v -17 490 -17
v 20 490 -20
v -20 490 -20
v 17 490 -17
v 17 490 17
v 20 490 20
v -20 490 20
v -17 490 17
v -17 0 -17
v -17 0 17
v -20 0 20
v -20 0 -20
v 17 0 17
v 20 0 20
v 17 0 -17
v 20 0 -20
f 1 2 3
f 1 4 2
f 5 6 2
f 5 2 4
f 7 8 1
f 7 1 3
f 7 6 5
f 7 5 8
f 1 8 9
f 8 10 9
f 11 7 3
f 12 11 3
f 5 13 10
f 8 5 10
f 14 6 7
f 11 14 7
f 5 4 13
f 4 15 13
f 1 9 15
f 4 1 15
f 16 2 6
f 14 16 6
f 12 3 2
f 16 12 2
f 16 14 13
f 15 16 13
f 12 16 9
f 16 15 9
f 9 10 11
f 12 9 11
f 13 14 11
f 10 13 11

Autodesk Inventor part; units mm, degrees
ref_plane "YZ Plane" through (0, 0, 0) normal (1, 0, 0) x (0, 1, 0)
ref_plane "XZ Plane" through (0, 0, 0) normal (0, 1, 0) x (-1, 0, 0)
ref_plane "XY Plane" through (0, 0, 0) normal (0, 0, 1) x (1, 0, 0)
sketch "Sketch1" plane through (0, 0, 0) normal (0, 1, 0) x (-1, 0, 0)
  line L0 (-20, 20) -> (20, 20)
  line L1 (20, 20) -> (20, -20)
  line L2 (20, -20) -> (-20, -20)
  line L3 (-20, -20) -> (-20, 20)
  line L4 (-20, 20) -> (20, -20) construction
  line L5 (20, 20) -> (-20, -20) construction
  line L6 (-17, 17) -> (17, 17)
  line L7 (17, 17) -> (17, -17)
  line L8 (17, -17) -> (-17, -17)
  line L9 (-17, -17) -> (-17, 17)
  line L10 (-17, 17) -> (17, -17) construction
  line L11 (17, 17) -> (-17, -17) construction
  point P0 (0, 0)
  dimension "d0" = 40
  dimension "d1" = 40
  dimension "d2" = 34
  dimension "d3" = 34
  dimension "d4" = 3
extrude "Extrusion1" add sketch "Sketch1" along normal blind 490
properties part number "Tube 49 cm"
